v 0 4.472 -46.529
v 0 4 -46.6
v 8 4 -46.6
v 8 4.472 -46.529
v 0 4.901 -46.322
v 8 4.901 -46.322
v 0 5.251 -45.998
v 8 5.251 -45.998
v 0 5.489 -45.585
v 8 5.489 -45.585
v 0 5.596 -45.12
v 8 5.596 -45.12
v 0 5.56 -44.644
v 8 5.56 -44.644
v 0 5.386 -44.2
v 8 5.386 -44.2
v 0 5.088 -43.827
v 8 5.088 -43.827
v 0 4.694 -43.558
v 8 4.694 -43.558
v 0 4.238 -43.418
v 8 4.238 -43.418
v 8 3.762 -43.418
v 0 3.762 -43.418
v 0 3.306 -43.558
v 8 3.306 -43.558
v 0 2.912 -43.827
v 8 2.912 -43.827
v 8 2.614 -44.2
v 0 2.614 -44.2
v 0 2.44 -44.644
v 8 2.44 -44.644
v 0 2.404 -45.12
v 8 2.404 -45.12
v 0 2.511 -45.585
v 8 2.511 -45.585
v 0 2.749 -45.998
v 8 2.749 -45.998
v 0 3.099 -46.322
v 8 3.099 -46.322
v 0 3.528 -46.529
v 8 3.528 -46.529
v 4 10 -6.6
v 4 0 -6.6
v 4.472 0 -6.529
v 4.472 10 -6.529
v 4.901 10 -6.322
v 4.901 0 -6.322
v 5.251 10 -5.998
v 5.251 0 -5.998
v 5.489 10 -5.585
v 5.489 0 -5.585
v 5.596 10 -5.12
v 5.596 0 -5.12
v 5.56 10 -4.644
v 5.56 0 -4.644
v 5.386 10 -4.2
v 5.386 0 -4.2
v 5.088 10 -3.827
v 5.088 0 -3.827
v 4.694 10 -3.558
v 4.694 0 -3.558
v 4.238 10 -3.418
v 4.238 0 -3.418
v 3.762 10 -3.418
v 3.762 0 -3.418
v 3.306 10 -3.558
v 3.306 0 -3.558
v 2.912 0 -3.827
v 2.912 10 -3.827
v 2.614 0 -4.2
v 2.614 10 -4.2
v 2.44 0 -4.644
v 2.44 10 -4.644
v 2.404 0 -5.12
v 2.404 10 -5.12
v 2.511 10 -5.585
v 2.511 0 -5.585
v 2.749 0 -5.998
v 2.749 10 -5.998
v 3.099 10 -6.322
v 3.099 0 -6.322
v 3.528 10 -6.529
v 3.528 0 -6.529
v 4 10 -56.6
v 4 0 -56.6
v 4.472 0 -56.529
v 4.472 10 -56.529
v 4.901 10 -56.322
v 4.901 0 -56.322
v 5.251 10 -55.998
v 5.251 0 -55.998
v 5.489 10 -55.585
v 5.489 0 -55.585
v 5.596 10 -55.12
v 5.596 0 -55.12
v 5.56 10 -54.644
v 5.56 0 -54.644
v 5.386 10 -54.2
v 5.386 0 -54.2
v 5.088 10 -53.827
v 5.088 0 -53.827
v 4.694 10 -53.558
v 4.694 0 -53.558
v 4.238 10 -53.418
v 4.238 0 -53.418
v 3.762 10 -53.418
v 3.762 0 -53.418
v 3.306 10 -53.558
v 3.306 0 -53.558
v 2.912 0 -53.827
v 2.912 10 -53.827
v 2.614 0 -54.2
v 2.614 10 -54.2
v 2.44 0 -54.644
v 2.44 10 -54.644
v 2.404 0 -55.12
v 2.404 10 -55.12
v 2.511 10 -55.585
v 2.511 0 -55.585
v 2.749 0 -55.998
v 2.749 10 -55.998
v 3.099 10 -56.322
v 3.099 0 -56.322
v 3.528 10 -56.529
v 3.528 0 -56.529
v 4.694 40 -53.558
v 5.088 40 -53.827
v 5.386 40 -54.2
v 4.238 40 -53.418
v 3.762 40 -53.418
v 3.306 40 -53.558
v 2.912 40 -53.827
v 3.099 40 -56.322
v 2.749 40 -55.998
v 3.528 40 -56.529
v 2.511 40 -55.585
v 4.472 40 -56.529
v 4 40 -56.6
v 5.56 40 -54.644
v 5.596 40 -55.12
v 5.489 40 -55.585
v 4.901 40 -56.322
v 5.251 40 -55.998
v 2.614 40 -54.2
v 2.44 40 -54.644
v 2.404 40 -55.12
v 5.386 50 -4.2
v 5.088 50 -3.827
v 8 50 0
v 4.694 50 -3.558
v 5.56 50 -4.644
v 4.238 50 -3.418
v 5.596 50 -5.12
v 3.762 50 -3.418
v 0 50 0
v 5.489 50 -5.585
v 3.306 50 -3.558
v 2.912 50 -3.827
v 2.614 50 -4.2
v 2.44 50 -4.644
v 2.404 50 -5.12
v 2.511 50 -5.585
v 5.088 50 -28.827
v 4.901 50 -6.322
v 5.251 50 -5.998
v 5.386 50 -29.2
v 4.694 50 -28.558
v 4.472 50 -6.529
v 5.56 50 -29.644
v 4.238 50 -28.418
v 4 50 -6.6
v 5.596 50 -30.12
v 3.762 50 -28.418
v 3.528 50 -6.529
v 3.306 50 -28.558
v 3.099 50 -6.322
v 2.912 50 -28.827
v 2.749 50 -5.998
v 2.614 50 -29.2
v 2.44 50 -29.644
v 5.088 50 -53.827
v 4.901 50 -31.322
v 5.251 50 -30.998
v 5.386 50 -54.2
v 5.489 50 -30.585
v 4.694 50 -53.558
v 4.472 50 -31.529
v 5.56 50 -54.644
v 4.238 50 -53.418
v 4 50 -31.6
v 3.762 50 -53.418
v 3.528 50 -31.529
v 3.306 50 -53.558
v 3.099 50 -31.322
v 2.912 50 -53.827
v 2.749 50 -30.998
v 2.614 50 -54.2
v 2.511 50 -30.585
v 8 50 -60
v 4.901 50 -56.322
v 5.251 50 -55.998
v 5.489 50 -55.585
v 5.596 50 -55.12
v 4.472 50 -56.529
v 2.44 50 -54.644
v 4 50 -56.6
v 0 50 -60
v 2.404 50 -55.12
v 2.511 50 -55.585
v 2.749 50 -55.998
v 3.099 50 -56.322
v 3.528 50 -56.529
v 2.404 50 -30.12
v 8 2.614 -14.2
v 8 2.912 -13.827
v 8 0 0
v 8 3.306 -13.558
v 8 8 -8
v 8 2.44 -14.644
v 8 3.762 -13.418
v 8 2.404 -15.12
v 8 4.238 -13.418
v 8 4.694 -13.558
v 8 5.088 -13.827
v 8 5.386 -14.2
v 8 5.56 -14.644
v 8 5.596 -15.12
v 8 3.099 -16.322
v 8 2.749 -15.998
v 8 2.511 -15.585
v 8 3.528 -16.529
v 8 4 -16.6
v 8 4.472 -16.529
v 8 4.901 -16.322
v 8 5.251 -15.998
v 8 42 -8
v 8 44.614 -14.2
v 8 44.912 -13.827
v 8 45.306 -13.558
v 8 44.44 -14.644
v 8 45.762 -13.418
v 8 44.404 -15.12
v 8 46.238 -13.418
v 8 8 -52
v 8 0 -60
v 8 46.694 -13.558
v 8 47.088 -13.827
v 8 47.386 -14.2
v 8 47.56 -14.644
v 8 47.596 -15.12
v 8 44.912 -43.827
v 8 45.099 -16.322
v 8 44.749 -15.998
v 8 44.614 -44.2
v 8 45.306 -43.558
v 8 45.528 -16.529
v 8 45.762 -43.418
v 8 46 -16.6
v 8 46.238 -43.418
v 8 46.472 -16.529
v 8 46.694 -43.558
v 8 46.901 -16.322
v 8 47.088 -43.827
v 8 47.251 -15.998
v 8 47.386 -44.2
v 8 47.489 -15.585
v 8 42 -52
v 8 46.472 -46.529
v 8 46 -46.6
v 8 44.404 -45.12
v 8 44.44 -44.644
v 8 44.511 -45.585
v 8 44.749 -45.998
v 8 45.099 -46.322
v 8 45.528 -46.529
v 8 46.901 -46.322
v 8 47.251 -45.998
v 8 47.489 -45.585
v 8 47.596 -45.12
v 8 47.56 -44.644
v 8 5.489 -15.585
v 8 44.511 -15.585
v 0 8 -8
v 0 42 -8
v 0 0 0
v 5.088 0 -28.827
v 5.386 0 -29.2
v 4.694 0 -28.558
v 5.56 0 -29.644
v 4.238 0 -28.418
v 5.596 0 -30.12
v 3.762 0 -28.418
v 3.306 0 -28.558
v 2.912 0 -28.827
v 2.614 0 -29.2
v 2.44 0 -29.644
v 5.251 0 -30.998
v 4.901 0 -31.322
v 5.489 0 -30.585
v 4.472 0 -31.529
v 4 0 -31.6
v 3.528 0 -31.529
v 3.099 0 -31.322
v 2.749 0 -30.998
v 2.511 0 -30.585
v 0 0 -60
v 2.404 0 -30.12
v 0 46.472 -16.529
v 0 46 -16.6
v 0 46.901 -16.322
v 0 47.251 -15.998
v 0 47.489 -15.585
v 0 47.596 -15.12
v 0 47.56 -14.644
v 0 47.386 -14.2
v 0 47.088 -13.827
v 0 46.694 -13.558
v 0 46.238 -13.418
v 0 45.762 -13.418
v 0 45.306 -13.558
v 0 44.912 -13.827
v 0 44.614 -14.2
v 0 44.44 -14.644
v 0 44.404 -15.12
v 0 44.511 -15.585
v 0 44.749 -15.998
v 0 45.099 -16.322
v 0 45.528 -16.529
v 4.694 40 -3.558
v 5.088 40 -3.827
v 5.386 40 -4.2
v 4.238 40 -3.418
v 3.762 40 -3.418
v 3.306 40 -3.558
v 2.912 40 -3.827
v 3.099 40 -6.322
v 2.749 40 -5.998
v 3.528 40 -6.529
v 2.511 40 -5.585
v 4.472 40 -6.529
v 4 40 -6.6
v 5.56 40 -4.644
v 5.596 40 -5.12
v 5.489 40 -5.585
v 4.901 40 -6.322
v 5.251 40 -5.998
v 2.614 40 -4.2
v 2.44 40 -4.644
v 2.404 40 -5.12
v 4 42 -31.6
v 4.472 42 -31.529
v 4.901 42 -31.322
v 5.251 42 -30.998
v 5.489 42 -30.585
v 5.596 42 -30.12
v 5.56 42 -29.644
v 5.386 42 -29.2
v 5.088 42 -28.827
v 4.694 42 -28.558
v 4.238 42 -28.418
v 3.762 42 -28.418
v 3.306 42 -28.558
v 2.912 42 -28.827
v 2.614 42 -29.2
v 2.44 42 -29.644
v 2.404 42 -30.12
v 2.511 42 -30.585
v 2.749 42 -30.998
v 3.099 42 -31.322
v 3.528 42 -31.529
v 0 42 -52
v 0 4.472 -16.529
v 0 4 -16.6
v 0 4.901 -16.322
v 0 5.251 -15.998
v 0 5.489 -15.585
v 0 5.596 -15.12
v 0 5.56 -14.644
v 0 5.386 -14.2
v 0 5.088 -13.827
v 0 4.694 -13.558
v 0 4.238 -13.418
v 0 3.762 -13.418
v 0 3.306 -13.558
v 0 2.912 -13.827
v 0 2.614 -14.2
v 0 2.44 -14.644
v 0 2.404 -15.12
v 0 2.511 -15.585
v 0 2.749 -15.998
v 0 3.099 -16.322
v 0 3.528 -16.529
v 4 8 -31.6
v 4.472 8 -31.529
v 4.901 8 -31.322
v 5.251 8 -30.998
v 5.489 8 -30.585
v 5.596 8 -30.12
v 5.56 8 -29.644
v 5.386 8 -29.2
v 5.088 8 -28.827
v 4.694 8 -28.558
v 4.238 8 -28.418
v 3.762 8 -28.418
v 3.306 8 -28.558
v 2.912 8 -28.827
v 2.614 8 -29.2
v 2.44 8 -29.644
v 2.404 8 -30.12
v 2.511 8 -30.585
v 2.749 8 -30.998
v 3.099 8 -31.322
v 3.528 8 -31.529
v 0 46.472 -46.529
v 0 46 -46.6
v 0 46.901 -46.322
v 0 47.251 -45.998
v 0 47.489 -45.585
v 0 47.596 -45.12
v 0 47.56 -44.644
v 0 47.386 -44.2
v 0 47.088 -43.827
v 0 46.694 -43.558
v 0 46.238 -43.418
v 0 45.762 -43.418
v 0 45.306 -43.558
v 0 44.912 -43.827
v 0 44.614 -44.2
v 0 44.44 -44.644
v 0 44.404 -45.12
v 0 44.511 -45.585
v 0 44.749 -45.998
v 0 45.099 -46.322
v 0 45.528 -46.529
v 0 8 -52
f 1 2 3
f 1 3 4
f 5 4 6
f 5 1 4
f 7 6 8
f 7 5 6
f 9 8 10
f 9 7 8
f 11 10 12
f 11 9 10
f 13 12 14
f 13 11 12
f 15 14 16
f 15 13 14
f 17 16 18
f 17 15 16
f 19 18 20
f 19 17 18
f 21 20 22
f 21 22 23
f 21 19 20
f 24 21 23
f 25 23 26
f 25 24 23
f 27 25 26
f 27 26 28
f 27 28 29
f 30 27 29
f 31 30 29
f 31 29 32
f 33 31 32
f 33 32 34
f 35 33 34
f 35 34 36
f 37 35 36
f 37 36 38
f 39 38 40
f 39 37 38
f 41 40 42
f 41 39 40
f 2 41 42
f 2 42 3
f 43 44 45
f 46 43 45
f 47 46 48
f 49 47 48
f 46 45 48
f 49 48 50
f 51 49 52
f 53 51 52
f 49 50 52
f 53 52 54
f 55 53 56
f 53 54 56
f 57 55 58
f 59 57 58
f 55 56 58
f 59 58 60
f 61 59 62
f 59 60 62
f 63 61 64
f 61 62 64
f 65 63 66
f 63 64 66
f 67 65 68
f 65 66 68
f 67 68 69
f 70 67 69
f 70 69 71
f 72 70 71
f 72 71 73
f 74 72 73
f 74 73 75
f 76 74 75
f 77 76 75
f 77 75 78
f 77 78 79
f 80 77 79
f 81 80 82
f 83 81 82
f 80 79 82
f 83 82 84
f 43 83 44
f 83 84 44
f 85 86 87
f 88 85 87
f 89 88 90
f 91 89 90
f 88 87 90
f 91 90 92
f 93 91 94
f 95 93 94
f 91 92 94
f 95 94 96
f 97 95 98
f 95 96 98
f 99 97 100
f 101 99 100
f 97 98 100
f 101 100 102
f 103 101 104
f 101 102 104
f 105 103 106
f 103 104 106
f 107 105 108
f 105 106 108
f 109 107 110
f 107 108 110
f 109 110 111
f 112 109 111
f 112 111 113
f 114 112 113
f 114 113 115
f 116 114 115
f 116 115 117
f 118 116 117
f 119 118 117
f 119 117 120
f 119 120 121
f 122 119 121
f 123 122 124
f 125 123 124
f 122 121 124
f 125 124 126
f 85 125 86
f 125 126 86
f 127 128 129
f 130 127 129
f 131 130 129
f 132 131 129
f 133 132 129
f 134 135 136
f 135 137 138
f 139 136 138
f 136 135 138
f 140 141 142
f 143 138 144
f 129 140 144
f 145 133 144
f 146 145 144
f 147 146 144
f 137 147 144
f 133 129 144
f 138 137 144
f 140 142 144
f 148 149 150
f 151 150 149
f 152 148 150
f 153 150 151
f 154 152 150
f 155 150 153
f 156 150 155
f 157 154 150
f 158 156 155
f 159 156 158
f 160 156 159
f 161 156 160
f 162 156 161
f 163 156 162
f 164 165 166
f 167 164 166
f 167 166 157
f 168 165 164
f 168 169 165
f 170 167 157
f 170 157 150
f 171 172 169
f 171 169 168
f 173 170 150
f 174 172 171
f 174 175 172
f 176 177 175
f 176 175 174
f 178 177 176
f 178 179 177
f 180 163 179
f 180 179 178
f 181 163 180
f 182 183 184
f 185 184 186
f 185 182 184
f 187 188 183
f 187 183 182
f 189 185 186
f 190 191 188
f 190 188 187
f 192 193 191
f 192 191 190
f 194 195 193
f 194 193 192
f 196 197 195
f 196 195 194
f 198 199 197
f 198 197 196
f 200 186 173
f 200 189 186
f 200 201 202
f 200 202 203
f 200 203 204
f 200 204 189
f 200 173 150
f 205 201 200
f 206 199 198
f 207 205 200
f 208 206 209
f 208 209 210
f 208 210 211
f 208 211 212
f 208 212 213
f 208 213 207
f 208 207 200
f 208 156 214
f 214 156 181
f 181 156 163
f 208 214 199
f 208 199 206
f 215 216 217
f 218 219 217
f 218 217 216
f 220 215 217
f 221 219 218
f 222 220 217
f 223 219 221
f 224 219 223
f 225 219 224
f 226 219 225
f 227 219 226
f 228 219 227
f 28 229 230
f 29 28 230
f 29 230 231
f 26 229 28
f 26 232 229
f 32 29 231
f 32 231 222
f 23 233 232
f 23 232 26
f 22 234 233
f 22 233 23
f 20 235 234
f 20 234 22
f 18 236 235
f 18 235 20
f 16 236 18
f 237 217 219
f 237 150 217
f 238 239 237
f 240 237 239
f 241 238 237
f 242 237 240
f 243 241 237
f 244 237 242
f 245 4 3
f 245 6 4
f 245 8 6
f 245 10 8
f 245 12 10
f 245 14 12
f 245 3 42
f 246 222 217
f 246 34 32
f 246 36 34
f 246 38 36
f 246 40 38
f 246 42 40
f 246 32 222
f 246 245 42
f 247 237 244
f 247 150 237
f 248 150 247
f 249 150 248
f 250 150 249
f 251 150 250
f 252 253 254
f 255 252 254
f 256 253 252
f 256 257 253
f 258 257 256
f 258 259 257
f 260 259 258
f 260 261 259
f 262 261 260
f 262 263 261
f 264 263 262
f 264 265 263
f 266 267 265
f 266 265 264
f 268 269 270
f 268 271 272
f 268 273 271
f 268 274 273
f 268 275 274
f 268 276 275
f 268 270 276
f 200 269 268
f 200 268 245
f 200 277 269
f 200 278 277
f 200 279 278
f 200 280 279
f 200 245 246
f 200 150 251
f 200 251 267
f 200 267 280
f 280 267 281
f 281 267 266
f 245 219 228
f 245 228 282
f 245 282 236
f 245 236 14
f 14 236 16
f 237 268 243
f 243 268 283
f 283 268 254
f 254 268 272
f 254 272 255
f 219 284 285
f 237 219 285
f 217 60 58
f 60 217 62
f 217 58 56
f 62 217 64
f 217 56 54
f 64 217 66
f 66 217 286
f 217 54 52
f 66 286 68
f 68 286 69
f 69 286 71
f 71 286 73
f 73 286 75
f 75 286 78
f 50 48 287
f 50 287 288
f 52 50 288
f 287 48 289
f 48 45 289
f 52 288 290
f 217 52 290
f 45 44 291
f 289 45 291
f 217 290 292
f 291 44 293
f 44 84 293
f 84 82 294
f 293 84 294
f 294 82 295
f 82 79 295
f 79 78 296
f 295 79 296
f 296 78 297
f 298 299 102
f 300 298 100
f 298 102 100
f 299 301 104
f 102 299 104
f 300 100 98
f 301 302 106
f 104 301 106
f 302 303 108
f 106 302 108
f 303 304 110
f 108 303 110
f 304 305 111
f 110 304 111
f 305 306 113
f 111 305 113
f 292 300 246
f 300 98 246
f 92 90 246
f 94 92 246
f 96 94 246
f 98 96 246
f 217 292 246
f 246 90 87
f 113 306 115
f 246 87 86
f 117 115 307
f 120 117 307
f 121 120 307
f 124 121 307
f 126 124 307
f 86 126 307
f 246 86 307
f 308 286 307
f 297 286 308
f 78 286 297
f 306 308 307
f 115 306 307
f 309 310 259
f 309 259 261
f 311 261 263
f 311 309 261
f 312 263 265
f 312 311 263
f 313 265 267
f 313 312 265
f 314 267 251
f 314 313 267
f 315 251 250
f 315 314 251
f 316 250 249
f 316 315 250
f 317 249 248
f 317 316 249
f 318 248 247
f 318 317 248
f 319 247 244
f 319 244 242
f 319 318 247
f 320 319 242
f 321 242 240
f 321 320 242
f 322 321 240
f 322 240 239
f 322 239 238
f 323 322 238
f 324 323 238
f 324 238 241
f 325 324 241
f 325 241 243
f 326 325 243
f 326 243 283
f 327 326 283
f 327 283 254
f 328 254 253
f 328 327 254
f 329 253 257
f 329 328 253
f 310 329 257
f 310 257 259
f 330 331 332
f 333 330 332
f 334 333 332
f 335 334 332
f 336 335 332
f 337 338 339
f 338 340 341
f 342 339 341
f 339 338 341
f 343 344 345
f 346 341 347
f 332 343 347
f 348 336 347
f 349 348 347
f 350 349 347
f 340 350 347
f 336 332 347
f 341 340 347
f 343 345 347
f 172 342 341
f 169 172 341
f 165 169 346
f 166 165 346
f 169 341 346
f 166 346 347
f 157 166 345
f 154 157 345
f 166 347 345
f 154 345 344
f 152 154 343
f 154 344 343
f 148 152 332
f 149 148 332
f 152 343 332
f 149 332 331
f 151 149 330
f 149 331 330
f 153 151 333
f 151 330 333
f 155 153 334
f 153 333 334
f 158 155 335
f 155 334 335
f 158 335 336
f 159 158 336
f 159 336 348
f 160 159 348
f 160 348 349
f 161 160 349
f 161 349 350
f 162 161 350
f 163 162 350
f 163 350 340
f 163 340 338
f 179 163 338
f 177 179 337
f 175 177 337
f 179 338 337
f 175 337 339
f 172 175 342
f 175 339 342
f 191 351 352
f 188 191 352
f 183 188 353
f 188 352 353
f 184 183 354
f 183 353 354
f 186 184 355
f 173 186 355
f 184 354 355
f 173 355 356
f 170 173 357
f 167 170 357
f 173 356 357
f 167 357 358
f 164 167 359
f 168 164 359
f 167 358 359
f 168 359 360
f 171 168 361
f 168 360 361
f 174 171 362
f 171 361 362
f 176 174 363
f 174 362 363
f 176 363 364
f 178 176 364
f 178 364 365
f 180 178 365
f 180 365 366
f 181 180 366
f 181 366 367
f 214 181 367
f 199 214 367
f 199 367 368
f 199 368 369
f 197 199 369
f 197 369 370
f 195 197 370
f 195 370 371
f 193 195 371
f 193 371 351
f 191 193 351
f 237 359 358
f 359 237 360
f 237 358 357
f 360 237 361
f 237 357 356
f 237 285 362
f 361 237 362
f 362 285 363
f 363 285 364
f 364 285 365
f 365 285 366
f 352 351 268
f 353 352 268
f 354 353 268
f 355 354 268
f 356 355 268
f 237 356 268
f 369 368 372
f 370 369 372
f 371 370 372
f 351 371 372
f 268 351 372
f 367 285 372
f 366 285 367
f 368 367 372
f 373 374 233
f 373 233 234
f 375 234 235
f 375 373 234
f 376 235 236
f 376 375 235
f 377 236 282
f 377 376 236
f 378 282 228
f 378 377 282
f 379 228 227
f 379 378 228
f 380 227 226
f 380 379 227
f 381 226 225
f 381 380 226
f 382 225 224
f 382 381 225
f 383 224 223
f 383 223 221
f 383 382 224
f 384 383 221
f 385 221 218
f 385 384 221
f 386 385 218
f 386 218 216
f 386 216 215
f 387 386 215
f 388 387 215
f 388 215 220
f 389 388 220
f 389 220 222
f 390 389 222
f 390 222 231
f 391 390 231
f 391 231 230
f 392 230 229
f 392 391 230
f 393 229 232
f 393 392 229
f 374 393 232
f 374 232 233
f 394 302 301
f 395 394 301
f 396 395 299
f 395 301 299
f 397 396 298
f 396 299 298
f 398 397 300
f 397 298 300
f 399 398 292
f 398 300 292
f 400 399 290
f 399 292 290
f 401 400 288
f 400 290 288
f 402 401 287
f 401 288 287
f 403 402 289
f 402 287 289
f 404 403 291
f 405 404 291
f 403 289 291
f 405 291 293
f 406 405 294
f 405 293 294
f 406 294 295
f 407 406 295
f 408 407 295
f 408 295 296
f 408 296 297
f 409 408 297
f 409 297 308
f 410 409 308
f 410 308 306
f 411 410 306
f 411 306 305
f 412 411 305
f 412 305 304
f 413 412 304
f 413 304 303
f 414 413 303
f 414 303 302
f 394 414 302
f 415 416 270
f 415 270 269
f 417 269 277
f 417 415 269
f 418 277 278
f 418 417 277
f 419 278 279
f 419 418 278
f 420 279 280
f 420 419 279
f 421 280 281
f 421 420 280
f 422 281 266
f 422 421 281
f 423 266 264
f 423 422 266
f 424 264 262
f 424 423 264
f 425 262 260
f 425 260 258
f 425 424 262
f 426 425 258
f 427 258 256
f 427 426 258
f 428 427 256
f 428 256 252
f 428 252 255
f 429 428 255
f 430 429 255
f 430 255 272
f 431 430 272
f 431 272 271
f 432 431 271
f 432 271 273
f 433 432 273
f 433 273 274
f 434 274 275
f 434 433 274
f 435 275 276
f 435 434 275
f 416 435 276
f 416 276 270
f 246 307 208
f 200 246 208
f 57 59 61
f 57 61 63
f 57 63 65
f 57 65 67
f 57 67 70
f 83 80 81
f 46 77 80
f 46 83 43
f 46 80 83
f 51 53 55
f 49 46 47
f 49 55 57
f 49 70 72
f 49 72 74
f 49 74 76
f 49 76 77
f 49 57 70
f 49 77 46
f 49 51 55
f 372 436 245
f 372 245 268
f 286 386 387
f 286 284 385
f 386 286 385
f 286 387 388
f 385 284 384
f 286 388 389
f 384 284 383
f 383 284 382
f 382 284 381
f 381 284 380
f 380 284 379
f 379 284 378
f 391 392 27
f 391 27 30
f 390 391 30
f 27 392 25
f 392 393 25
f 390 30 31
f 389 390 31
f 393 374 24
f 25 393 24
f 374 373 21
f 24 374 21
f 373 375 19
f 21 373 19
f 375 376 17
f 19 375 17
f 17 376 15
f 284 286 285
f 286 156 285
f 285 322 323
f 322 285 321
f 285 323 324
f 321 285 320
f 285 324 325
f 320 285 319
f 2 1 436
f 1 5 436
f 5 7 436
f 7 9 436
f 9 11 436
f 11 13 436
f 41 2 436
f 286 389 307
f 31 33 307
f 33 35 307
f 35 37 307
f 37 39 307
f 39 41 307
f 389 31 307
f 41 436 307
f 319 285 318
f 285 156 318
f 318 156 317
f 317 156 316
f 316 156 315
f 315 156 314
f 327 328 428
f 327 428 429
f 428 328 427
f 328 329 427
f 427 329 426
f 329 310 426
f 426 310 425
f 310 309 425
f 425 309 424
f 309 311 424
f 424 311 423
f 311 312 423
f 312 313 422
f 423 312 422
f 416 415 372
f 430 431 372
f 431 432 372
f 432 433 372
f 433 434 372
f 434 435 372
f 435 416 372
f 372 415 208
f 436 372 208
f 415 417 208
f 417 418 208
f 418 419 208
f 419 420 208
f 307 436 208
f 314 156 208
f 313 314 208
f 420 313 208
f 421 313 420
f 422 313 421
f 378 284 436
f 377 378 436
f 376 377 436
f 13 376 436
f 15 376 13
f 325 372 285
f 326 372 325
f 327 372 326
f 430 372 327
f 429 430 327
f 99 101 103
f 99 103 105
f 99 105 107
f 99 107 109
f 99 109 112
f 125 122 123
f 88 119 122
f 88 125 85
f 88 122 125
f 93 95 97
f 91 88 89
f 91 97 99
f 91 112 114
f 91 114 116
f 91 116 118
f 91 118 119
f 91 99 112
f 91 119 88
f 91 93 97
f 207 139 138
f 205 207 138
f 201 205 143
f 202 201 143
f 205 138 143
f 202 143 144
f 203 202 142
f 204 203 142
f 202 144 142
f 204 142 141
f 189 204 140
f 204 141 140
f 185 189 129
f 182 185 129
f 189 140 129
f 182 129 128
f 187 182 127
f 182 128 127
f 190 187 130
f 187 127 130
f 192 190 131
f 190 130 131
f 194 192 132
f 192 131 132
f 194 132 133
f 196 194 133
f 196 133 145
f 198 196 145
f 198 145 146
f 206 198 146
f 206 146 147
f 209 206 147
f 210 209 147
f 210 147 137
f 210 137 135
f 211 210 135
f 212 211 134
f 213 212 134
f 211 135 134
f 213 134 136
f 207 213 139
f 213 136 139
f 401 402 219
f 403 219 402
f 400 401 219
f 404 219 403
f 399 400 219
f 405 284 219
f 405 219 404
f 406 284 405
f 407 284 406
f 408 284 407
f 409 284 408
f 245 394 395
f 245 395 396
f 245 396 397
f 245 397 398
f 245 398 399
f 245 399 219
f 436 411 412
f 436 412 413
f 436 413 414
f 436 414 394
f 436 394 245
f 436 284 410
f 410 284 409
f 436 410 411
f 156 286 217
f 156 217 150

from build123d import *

# Parameters (mm, degrees)
SKETCH_1_W          = 60
SKETCH_1_H          = 50
SKETCH_1_R          = 1.6
SKETCH_1_W_2        = 44
SKETCH_1_H_2        = 34
EXTRUDE_1_DEPTH     = 8
SKETCH_2_R          = 1.6
CUT_EXTRUDE_1_DEPTH = 10
CUT_EXTRUDE_START   = -40
SKETCH_2_2_R        = 1.6
CUT_EXTRUDE_2_DEPTH = 10


with BuildPart() as part:
    # 草图1 → 凸台-拉伸1 (new body)
    with BuildSketch(Plane(origin=(0, 0, 0), x_dir=(0, 0, -1), z_dir=(1, 0, 0))):
        with Locations((30, 25)):
            Rectangle(SKETCH_1_W, SKETCH_1_H)
        with Locations((15, 46)):
            Circle(SKETCH_1_R, mode=Mode.SUBTRACT)
        with Locations((45, 46)):
            Circle(SKETCH_1_R, mode=Mode.SUBTRACT)
        with Locations((15, 4)):
            Circle(SKETCH_1_R, mode=Mode.SUBTRACT)
        with Locations((45, 4)):
            Circle(SKETCH_1_R, mode=Mode.SUBTRACT)
        with Locations((30, 25)):
            Rectangle(SKETCH_1_W_2, SKETCH_1_H_2, mode=Mode.SUBTRACT)
    extrude(amount=EXTRUDE_1_DEPTH)

    # 草图2 → 切除-拉伸1 (cut)
    with BuildSketch(Plane.XZ):
        with Locations(Location((4, -5, 0), (0, 0, 270))):
            Circle(SKETCH_2_R)
        with Locations(Location((4, -30, 0), (0, 0, 270))):
            Circle(SKETCH_2_R)
        with Locations(Location((4, -55, 0), (0, 0, 270))):
            Circle(SKETCH_2_R)
    extrude(amount=-CUT_EXTRUDE_1_DEPTH, mode=Mode.SUBTRACT)

    # 草图2<2> → 切除-拉伸2 (cut)
    with BuildSketch(Plane.XZ.offset(CUT_EXTRUDE_START)):
        with Locations(Location((4, -5, 0), (0, 0, 270))):
            Circle(SKETCH_2_2_R)
        with Locations(Location((4, -30, 0), (0, 0, 270))):
            Circle(SKETCH_2_2_R)
        with Locations(Location((4, -55, 0), (0, 0, 270))):
            Circle(SKETCH_2_2_R)
    extrude(amount=-CUT_EXTRUDE_2_DEPTH, mode=Mode.SUBTRACT)


solid = part.part
